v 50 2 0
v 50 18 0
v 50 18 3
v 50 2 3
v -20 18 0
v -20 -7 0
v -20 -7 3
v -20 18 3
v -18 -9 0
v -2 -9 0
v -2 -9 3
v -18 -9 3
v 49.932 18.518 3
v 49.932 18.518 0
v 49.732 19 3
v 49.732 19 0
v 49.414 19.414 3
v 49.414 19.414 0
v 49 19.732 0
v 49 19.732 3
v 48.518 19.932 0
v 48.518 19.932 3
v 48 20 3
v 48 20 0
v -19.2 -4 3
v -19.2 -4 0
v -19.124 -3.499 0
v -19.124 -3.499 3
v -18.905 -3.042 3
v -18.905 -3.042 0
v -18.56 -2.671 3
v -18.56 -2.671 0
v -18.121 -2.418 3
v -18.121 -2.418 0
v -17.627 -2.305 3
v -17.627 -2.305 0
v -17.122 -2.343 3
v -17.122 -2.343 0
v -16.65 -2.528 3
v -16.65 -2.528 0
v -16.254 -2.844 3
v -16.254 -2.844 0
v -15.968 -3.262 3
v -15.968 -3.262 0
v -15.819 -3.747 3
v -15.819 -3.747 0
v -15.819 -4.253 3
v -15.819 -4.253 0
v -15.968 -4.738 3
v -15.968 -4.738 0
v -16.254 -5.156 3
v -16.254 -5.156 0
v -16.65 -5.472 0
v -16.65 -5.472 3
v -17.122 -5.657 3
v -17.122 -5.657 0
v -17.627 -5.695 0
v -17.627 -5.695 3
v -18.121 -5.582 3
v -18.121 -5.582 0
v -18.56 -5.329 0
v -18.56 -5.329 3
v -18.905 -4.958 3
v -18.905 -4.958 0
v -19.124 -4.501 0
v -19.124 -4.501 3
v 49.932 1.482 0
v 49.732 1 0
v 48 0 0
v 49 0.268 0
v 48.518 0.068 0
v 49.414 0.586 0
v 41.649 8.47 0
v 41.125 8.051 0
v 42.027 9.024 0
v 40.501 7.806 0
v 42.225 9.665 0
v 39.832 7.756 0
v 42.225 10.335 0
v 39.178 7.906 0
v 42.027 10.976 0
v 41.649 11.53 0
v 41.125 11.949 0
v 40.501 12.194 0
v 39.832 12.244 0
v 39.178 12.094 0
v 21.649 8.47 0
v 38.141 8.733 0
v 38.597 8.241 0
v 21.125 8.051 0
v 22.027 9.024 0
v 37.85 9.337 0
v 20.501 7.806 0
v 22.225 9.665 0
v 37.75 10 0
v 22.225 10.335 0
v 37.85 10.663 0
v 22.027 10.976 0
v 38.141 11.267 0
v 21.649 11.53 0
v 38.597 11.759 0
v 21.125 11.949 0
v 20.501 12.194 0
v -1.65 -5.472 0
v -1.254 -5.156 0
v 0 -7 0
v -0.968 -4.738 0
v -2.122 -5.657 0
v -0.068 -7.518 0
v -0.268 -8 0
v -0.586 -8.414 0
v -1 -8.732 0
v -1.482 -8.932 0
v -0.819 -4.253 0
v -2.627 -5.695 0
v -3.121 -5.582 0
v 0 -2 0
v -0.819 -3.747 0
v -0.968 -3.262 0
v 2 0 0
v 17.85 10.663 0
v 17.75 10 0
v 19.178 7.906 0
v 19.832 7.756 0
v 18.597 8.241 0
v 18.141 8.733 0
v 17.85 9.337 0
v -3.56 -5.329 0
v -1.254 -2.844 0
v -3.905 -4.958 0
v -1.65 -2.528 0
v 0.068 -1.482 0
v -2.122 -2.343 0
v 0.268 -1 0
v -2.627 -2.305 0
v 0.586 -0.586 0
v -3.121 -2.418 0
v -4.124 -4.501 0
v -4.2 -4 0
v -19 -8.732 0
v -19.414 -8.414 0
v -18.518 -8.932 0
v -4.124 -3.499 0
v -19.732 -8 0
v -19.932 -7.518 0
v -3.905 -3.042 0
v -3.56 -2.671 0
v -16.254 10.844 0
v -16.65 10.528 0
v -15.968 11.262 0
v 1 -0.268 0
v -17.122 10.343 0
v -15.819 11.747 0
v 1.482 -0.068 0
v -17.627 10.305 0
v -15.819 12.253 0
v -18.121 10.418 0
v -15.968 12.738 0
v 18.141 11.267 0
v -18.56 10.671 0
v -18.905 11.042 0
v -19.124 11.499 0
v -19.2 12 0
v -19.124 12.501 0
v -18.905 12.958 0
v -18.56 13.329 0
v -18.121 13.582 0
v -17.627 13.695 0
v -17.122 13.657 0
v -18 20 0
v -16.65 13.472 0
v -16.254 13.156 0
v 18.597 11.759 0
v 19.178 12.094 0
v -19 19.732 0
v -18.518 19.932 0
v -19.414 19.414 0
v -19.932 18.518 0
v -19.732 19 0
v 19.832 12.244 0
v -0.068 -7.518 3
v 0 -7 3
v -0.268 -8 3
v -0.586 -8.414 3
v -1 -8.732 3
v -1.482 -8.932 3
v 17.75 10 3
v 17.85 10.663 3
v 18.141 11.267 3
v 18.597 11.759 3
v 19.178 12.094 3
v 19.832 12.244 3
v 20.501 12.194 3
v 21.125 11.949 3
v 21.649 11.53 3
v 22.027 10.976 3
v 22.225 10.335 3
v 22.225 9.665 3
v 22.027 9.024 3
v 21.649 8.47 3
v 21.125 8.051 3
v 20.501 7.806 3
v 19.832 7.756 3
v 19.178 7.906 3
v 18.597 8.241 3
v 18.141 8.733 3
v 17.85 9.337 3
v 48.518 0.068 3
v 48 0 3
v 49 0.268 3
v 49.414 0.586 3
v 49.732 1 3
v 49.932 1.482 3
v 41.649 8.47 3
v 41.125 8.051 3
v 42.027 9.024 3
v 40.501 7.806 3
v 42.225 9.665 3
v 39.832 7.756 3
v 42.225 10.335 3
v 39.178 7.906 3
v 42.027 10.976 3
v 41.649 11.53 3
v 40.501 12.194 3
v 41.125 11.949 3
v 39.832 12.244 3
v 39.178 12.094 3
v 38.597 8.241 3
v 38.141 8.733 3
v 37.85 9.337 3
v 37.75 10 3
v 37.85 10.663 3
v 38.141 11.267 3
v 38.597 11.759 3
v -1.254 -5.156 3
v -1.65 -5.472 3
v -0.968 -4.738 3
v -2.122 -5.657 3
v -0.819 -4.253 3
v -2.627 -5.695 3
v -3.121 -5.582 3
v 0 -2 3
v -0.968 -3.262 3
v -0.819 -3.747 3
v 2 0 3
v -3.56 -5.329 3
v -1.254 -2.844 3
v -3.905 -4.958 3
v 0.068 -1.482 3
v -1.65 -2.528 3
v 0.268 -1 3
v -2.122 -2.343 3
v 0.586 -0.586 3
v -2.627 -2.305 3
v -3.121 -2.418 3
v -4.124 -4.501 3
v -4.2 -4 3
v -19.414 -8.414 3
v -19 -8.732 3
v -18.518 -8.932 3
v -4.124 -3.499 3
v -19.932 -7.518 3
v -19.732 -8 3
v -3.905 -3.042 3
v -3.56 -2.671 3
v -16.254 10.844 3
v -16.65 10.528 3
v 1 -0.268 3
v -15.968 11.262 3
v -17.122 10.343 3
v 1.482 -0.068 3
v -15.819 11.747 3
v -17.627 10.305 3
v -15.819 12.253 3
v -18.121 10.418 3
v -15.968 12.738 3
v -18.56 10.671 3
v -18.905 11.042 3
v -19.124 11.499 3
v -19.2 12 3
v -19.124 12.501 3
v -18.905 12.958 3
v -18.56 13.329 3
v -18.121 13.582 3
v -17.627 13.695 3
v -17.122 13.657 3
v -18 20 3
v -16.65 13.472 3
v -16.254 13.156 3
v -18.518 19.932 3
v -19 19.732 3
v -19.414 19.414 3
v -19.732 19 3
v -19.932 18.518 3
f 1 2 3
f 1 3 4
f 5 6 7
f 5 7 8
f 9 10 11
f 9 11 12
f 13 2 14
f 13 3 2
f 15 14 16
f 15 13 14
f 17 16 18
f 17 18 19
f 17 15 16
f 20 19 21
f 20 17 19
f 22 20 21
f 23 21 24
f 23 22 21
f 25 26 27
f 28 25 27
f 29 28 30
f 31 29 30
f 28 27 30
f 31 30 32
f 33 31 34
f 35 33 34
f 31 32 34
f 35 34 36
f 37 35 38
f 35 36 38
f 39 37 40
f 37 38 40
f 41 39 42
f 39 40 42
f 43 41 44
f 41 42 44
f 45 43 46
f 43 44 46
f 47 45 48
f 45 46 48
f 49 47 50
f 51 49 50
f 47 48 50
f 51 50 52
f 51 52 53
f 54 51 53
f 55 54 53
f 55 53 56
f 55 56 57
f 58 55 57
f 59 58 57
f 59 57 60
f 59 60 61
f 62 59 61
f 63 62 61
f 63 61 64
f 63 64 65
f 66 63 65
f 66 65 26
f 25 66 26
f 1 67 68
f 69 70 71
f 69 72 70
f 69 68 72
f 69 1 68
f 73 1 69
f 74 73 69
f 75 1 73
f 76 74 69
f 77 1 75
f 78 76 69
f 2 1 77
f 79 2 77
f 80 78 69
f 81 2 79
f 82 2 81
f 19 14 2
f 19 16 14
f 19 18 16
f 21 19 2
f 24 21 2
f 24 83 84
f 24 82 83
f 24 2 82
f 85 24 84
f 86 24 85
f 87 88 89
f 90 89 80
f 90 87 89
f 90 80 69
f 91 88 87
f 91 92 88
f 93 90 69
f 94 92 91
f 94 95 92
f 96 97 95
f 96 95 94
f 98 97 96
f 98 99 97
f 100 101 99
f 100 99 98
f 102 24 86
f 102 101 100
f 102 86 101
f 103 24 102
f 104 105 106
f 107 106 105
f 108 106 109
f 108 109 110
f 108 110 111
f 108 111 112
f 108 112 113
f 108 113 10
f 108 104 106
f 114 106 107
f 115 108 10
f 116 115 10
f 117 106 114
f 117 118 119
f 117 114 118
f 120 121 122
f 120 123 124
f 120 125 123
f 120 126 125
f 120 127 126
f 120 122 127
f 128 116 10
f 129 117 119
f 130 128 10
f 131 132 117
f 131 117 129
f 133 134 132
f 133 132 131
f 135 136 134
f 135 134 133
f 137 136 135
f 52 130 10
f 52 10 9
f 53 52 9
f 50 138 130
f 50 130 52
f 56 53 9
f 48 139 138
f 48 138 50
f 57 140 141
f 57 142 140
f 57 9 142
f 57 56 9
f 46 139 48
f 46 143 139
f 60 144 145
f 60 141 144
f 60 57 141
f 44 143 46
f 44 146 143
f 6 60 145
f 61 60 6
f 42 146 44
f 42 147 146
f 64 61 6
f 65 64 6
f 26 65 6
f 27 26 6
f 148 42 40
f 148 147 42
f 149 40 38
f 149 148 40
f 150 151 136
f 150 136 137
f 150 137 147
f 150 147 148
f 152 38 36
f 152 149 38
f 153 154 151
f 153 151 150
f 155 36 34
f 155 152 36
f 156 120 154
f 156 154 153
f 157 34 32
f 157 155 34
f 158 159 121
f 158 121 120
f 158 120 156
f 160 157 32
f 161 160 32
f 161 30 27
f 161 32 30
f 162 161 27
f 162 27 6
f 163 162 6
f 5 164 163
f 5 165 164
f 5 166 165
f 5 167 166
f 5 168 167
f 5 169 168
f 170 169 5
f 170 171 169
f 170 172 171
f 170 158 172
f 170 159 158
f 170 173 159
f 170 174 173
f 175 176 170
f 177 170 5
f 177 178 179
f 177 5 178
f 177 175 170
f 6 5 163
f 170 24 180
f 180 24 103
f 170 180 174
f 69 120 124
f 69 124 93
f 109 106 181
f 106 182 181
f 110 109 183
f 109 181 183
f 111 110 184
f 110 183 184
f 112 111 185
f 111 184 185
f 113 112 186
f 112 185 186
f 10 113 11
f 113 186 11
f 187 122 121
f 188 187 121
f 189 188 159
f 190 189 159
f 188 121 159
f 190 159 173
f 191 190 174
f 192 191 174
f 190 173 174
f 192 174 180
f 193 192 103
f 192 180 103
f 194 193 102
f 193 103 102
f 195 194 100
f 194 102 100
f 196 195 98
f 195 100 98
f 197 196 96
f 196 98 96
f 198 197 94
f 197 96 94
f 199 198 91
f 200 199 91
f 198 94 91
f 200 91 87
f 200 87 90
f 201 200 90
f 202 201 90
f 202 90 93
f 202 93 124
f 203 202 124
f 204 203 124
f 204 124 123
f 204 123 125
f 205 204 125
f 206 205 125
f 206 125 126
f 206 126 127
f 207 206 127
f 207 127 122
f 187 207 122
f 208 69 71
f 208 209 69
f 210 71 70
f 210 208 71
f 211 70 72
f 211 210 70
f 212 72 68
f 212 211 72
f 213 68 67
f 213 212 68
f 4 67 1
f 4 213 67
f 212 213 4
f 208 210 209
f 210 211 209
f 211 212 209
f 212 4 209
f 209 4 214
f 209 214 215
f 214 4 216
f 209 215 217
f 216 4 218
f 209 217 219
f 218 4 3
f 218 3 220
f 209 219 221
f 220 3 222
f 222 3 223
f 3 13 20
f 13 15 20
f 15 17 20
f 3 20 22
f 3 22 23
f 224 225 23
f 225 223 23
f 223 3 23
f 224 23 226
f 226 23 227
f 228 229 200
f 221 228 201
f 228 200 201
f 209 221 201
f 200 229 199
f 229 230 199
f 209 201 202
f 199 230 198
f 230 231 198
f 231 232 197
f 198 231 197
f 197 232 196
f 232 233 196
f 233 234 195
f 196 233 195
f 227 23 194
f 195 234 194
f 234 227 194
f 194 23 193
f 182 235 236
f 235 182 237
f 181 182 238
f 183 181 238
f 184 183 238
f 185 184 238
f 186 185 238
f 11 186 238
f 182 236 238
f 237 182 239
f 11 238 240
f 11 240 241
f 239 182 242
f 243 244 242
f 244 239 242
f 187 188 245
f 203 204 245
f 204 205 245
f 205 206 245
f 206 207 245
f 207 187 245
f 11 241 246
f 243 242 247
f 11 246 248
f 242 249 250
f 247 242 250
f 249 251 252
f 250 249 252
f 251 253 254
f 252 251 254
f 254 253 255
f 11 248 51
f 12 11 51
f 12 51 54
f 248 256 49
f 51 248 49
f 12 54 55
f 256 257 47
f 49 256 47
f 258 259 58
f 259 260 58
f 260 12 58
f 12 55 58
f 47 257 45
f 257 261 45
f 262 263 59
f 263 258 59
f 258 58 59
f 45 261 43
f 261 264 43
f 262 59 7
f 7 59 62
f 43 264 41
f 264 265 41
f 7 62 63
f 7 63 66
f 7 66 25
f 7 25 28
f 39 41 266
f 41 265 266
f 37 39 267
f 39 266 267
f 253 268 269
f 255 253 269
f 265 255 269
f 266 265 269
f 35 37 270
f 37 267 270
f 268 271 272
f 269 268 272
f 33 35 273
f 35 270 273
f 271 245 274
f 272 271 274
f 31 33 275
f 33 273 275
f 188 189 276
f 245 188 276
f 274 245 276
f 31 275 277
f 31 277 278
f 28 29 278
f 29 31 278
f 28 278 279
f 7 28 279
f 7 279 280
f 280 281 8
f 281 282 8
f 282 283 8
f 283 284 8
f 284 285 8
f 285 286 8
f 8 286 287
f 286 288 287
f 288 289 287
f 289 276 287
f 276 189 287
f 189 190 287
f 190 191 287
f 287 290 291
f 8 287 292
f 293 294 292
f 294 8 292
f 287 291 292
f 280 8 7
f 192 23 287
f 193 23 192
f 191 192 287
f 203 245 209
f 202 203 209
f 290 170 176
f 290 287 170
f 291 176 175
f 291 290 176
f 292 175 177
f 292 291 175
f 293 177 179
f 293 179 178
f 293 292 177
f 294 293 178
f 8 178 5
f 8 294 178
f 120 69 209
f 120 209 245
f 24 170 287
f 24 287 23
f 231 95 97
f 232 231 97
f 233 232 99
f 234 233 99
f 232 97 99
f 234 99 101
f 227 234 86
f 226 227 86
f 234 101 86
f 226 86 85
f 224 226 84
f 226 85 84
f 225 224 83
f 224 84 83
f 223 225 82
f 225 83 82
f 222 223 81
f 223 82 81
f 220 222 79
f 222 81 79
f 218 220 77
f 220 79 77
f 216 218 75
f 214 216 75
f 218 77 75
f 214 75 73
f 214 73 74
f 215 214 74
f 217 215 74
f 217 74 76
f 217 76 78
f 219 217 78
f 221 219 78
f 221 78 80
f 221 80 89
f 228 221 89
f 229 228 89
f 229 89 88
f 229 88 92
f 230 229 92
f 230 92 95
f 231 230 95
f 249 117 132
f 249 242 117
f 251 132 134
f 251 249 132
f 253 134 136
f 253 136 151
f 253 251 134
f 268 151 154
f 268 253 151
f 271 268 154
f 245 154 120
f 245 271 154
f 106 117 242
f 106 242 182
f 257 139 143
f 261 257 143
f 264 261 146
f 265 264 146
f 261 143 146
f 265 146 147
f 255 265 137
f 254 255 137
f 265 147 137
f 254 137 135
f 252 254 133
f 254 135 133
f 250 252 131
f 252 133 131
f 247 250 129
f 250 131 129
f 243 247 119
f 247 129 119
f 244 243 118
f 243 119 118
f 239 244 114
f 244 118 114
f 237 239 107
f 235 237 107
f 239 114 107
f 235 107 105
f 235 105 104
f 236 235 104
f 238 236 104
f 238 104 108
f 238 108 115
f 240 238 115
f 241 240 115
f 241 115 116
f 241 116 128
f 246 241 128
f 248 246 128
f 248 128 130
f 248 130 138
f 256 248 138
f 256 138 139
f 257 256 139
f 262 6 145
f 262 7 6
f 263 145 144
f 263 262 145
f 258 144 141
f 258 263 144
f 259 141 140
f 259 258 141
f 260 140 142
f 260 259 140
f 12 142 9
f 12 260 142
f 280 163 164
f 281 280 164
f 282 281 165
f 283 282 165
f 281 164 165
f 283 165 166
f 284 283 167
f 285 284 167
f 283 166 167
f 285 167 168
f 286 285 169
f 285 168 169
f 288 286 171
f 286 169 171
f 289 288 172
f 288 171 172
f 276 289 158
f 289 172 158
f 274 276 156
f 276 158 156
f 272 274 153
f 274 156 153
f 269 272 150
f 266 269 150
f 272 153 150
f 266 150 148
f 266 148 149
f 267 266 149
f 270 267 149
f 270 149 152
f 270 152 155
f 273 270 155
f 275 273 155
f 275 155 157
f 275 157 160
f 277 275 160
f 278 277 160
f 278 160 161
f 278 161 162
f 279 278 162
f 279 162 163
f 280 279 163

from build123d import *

# Parameters (mm, degrees)
AUFSATZ_LINEAR_AUSTRAGEN1_DEPTH = 3
SKIZZE2_R                       = 1.7
SCHNITT_LINEAR_AUSTRAGEN1_DEPTH = 57.435804238
DURCHGANGSLOCH_F_R_M41_D        = 4.5
DURCHGANGSLOCH_F_R_M31_D        = 3.4
VERRUNDUNG1_R                   = 2
SKIZZE9_W                       = 16
SKIZZE9_H                       = 17
SCHNITT_LINEAR_AUSTRAGEN2_DEPTH = 57.435804238


with BuildPart() as part:
    # Skizze1 → Aufsatz-Linear austragen1 (new body)
    with BuildSketch(Plane.XY):
        with BuildLine():
            Line((0, 0), (0, -9))
            Line((0, -9), (-5, -9))
            Line((-5, -9), (-5, -21))
            ThreePointArc((-5, -21), (-10, -26), (-15, -21))
            Line((-15, -21), (-15, -9))
            Line((-15, -9), (-20, -9))
            Line((-20, -9), (-20, 20))
            Line((-20, 20), (50, 20))
            Line((50, 20), (50, 0))
            Line((50, 0), (0, 0))
        make_face()
    extrude(amount=AUFSATZ_LINEAR_AUSTRAGEN1_DEPTH)

    # Skizze2 → Schnitt-Linear austragen1 (cut, through all)
    with BuildSketch(Plane.XY.offset(3)):
        with Locations((-10, -21)):
            Circle(SKIZZE2_R)
    extrude(amount=-SCHNITT_LINEAR_AUSTRAGEN1_DEPTH, mode=Mode.SUBTRACT)

    # Durchgangsloch für M41 (through all)
    with Locations(Plane.XY.offset(3)):
        with Locations((20, 10), (40, 10)):
            Hole(DURCHGANGSLOCH_F_R_M41_D / 2)

    # Durchgangsloch für M31 (through all)
    with Locations(Plane.XY.offset(3)):
        with Locations((-17.5, 12), (-2.5, -4), (-17.5, -4)):
            Hole(DURCHGANGSLOCH_F_R_M31_D / 2)

    # Verrundung1
    verrundung1_edges = [part.edges().sort_by_distance(p)[0] for p in [
        (0, 0, 1.5),
        (0, -9, 1.5),
        (-5, -9, 1.5),
        (-15, -9, 1.5),
        (-20, -9, 1.5),
        (-20, 20, 1.5),
        (50, 20, 1.5),
        (50, 0, 1.5),
    ]]
    fillet(verrundung1_edges, radius=VERRUNDUNG1_R)

    # Skizze9 → Schnitt-Linear austragen2 (cut, through all)
    with BuildSketch(Plane.XY.offset(3)):
        with Locations((-10, -17.5)):
            Rectangle(SKIZZE9_W, SKIZZE9_H)
    extrude(amount=-SCHNITT_LINEAR_AUSTRAGEN2_DEPTH, mode=Mode.SUBTRACT)


solid = part.part
